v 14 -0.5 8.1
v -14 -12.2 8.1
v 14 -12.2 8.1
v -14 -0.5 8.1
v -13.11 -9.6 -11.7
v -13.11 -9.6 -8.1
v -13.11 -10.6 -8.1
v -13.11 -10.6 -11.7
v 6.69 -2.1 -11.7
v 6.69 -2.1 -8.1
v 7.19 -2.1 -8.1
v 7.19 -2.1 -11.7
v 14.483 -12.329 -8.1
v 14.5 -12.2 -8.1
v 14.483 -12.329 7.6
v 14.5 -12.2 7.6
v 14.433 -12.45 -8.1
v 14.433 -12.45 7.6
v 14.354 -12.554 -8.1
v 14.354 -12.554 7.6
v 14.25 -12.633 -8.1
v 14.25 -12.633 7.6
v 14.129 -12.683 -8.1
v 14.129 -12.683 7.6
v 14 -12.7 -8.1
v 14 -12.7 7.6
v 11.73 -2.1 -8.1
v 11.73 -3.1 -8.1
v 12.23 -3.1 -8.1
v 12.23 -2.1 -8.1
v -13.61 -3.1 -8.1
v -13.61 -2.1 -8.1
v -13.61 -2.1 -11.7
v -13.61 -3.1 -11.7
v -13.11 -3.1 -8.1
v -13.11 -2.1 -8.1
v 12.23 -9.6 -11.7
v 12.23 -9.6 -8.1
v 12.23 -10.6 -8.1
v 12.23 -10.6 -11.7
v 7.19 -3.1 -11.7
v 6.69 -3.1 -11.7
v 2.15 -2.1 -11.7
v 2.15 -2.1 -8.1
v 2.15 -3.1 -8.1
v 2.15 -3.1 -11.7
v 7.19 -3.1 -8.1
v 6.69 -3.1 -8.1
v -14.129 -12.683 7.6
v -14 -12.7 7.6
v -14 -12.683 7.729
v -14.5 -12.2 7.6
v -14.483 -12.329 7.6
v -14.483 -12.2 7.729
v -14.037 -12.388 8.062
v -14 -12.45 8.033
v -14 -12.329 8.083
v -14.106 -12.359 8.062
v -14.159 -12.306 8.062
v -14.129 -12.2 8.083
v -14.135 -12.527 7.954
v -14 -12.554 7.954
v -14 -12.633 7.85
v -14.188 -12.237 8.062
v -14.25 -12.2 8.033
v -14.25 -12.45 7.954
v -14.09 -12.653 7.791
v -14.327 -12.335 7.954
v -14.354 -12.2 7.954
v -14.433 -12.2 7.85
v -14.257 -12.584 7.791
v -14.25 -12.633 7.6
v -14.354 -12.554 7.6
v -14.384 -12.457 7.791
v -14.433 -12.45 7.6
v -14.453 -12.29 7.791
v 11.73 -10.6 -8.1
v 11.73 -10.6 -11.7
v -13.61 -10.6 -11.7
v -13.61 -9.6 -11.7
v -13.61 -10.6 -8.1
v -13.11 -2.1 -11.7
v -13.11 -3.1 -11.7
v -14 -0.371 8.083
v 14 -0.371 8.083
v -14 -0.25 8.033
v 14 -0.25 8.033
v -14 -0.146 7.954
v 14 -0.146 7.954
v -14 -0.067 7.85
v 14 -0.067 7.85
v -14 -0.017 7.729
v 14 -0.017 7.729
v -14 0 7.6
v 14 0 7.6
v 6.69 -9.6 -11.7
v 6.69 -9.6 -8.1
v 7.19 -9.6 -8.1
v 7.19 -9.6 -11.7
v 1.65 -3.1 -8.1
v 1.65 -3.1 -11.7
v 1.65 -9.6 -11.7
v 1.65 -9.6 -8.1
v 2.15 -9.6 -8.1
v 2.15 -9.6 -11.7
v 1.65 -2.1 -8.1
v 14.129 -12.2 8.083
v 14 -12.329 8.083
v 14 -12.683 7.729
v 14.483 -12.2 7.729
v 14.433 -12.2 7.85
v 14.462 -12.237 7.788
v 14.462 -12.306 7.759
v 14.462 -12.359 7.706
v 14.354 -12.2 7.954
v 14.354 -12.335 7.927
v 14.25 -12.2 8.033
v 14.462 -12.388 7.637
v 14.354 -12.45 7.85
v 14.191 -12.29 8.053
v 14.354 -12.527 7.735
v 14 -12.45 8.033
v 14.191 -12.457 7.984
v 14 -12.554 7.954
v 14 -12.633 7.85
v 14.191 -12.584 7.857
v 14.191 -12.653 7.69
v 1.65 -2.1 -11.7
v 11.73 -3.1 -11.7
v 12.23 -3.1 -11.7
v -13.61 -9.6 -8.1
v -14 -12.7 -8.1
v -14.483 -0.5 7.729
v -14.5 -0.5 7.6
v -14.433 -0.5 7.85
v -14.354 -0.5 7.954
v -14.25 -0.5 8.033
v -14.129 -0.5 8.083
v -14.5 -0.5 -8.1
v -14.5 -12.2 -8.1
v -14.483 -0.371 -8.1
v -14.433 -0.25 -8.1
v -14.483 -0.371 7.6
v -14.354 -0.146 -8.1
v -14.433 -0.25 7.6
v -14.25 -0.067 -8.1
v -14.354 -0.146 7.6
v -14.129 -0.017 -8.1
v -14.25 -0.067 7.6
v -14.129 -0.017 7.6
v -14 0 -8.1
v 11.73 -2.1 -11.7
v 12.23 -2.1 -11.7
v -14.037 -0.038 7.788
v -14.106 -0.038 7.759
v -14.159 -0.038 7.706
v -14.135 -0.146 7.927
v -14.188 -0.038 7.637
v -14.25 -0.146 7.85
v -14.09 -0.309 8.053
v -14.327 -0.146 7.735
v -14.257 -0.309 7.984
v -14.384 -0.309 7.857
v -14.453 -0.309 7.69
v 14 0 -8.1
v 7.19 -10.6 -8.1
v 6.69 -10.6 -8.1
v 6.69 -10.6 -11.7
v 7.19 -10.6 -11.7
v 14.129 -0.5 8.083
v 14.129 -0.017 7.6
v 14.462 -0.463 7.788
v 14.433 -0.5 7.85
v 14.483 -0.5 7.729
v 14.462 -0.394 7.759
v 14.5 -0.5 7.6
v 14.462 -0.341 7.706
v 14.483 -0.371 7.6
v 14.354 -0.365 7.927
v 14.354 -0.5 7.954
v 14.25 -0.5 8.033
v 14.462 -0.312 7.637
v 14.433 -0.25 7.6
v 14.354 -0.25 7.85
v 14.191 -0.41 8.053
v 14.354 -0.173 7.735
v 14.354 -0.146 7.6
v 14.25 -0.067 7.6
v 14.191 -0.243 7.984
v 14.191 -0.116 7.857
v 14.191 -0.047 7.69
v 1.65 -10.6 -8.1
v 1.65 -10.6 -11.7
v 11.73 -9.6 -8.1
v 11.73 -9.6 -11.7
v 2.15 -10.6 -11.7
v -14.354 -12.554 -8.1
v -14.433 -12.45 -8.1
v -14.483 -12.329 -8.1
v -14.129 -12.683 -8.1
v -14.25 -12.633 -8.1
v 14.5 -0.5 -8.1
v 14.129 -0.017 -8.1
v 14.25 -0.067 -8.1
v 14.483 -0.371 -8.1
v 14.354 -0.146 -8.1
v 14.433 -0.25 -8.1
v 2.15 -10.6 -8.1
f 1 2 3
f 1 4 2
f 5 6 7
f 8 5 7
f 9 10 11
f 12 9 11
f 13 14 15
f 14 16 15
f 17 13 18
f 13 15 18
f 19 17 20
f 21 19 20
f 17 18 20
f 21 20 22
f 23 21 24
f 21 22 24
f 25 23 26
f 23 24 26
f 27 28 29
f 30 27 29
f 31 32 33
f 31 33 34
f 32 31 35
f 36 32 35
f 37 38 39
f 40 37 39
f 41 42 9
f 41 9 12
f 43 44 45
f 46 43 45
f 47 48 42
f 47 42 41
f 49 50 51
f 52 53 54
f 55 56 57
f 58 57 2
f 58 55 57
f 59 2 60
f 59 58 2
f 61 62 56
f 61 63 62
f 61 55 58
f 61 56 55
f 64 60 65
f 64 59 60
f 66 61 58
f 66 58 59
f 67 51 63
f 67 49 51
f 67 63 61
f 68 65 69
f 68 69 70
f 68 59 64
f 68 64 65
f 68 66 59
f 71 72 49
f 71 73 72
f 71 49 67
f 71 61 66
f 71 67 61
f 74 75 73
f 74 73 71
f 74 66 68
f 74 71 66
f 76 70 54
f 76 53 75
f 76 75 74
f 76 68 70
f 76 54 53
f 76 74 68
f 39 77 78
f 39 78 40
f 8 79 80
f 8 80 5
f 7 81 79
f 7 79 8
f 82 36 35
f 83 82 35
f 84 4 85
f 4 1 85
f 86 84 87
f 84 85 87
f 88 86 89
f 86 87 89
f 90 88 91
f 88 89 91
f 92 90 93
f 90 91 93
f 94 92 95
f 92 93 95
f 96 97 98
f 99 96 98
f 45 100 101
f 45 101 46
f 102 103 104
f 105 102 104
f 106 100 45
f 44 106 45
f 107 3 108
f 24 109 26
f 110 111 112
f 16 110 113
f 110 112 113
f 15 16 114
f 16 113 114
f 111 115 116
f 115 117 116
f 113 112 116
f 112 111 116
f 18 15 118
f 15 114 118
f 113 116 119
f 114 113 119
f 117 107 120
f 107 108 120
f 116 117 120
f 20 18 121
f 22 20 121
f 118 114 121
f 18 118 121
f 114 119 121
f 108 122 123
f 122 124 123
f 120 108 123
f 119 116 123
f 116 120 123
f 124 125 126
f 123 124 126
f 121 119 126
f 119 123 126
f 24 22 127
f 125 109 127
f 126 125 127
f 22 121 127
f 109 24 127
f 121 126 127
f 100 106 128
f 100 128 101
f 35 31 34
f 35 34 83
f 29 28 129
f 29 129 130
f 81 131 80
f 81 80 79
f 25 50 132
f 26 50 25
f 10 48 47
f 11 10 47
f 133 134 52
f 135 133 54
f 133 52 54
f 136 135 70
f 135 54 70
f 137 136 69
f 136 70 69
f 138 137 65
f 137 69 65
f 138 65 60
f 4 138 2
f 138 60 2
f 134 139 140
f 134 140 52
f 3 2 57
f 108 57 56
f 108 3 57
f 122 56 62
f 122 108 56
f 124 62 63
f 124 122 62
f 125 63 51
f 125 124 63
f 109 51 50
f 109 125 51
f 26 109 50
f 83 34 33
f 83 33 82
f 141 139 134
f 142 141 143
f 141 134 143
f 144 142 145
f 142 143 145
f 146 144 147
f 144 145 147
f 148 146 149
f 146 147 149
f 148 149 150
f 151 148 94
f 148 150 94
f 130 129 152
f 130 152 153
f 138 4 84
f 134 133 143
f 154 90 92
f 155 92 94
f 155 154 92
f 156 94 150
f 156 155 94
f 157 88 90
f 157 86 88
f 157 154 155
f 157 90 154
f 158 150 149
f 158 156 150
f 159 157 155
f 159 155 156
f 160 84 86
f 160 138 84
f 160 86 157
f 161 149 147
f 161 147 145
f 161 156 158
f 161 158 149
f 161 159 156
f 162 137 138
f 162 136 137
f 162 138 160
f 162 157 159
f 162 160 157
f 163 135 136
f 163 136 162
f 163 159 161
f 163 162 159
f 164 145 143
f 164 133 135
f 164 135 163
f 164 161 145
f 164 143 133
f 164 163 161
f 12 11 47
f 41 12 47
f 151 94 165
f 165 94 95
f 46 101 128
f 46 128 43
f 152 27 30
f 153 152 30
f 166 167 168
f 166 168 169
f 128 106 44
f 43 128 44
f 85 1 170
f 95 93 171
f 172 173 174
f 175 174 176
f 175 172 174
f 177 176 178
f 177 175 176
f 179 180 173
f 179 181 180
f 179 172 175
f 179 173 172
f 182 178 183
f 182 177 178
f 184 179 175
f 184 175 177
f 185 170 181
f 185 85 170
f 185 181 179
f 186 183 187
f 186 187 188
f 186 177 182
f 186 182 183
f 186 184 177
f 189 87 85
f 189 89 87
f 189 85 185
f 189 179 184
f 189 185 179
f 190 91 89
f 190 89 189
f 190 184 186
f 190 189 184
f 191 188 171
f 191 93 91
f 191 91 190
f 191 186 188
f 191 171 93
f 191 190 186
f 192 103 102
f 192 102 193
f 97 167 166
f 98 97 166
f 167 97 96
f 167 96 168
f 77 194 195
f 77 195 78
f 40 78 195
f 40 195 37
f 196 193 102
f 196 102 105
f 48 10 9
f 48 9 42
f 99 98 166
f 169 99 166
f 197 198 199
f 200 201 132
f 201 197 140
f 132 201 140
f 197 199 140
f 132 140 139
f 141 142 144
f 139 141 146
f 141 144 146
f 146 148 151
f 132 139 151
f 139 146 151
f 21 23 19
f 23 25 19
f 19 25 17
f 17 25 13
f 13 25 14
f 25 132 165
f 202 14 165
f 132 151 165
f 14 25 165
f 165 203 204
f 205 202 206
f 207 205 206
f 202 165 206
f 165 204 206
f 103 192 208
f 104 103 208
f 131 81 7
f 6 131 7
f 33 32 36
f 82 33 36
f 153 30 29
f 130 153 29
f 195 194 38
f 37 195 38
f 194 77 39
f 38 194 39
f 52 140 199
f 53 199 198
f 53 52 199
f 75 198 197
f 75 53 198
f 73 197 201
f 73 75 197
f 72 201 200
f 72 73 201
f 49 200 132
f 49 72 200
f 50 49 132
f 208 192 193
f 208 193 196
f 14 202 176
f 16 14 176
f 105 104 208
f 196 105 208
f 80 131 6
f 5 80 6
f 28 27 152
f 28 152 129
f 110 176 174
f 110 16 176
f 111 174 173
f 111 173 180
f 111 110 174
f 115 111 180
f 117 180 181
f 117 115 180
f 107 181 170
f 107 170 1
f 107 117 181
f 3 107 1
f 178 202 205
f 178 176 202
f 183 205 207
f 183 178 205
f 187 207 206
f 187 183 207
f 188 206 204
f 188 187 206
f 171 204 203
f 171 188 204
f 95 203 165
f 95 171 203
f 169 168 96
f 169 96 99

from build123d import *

# Parameters (mm, degrees)
F0_W     = 29
F0_H     = 16.2
F1_DEPTH = 12.7
F2_W     = 0.5
F2_H     = 1
F3_DEPTH = 3.6
F4_R     = 0.5


# Not quite as in the source:
# - a feature names something its author has since deleted; it is built from what else it names


with BuildPart() as f1:
    # F0 (on Front) → F1 (new body)
    with BuildSketch(Plane.XZ):
        Rectangle(F0_W, F0_H)
    extrude(amount=F1_DEPTH)

    # F4
    f4_edges = [f1.edges().sort_by_distance(p)[0] for p in [
        (-14.5, -12.7, 0),
        (0, -12.7, 8.1),
        (-14.5, -6.35, 8.1),
        (0, 0, 8.1),
        (14.5, -6.35, 8.1),
        (14.5, -12.7, 0),
        (14.5, 0, 0),
        (-14.5, 0, 0),
    ]]
    fillet(f4_edges, radius=F4_R)


with BuildPart() as f3:
    # F2 (on face) → F3 (new body)
    with BuildSketch(Plane(origin=(0, 0, -8.1), x_dir=(1, 0, 0), z_dir=(0, 0, -1))):
        with Locations((1.9, 2.6)):
            Rectangle(F2_W, F2_H)
    extrude(amount=F3_DEPTH)


with BuildPart() as f3b:
    # F2 (on face) → F3, piece 2 (new body)
    with BuildSketch(Plane(origin=(0, 0, -8.1), x_dir=(1, 0, 0), z_dir=(0, 0, -1))):
        with Locations((1.9, 10.1)):
            Rectangle(F2_W, F2_H)
    extrude(amount=F3_DEPTH)


with BuildPart() as f3c:
    # F2 (on face) → F3, piece 3 (new body)
    with BuildSketch(Plane(origin=(0, 0, -8.1), x_dir=(1, 0, 0), z_dir=(0, 0, -1))):
        with Locations((6.94, 10.1)):
            Rectangle(F2_W, F2_H)
    extrude(amount=F3_DEPTH)


with BuildPart() as f3d:
    # F2 (on face) → F3, piece 4 (new body)
    with BuildSketch(Plane(origin=(0, 0, -8.1), x_dir=(1, 0, 0), z_dir=(0, 0, -1))):
        with Locations((11.98, 10.1)):
            Rectangle(F2_W, F2_H)
    extrude(amount=F3_DEPTH)


with BuildPart() as f3e:
    # F2 (on face) → F3, piece 5 (new body)
    with BuildSketch(Plane(origin=(0, 0, -8.1), x_dir=(1, 0, 0), z_dir=(0, 0, -1))):
        with Locations((6.94, 2.6)):
            Rectangle(F2_W, F2_H)
    extrude(amount=F3_DEPTH)


with BuildPart() as f3f:
    # F2 (on face) → F3, piece 6 (new body)
    with BuildSketch(Plane(origin=(0, 0, -8.1), x_dir=(1, 0, 0), z_dir=(0, 0, -1))):
        with Locations((11.98, 2.6)):
            Rectangle(F2_W, F2_H)
    extrude(amount=F3_DEPTH)


with BuildPart() as f3g:
    # F2 (on face) → F3, piece 7 (new body)
    with BuildSketch(Plane(origin=(0, 0, -8.1), x_dir=(1, 0, 0), z_dir=(0, 0, -1))):
        with Locations((-13.36, 10.1)):
            Rectangle(F2_W, F2_H)
    extrude(amount=F3_DEPTH)


with BuildPart() as f3h:
    # F2 (on face) → F3, piece 8 (new body)
    with BuildSketch(Plane(origin=(0, 0, -8.1), x_dir=(1, 0, 0), z_dir=(0, 0, -1))):
        with Locations((-13.36, 2.6)):
            Rectangle(F2_W, F2_H)
    extrude(amount=F3_DEPTH)


solid = Compound([f1.part, f3.part, f3b.part, f3c.part, f3d.part, f3e.part, f3f.part, f3g.part, f3h.part])
